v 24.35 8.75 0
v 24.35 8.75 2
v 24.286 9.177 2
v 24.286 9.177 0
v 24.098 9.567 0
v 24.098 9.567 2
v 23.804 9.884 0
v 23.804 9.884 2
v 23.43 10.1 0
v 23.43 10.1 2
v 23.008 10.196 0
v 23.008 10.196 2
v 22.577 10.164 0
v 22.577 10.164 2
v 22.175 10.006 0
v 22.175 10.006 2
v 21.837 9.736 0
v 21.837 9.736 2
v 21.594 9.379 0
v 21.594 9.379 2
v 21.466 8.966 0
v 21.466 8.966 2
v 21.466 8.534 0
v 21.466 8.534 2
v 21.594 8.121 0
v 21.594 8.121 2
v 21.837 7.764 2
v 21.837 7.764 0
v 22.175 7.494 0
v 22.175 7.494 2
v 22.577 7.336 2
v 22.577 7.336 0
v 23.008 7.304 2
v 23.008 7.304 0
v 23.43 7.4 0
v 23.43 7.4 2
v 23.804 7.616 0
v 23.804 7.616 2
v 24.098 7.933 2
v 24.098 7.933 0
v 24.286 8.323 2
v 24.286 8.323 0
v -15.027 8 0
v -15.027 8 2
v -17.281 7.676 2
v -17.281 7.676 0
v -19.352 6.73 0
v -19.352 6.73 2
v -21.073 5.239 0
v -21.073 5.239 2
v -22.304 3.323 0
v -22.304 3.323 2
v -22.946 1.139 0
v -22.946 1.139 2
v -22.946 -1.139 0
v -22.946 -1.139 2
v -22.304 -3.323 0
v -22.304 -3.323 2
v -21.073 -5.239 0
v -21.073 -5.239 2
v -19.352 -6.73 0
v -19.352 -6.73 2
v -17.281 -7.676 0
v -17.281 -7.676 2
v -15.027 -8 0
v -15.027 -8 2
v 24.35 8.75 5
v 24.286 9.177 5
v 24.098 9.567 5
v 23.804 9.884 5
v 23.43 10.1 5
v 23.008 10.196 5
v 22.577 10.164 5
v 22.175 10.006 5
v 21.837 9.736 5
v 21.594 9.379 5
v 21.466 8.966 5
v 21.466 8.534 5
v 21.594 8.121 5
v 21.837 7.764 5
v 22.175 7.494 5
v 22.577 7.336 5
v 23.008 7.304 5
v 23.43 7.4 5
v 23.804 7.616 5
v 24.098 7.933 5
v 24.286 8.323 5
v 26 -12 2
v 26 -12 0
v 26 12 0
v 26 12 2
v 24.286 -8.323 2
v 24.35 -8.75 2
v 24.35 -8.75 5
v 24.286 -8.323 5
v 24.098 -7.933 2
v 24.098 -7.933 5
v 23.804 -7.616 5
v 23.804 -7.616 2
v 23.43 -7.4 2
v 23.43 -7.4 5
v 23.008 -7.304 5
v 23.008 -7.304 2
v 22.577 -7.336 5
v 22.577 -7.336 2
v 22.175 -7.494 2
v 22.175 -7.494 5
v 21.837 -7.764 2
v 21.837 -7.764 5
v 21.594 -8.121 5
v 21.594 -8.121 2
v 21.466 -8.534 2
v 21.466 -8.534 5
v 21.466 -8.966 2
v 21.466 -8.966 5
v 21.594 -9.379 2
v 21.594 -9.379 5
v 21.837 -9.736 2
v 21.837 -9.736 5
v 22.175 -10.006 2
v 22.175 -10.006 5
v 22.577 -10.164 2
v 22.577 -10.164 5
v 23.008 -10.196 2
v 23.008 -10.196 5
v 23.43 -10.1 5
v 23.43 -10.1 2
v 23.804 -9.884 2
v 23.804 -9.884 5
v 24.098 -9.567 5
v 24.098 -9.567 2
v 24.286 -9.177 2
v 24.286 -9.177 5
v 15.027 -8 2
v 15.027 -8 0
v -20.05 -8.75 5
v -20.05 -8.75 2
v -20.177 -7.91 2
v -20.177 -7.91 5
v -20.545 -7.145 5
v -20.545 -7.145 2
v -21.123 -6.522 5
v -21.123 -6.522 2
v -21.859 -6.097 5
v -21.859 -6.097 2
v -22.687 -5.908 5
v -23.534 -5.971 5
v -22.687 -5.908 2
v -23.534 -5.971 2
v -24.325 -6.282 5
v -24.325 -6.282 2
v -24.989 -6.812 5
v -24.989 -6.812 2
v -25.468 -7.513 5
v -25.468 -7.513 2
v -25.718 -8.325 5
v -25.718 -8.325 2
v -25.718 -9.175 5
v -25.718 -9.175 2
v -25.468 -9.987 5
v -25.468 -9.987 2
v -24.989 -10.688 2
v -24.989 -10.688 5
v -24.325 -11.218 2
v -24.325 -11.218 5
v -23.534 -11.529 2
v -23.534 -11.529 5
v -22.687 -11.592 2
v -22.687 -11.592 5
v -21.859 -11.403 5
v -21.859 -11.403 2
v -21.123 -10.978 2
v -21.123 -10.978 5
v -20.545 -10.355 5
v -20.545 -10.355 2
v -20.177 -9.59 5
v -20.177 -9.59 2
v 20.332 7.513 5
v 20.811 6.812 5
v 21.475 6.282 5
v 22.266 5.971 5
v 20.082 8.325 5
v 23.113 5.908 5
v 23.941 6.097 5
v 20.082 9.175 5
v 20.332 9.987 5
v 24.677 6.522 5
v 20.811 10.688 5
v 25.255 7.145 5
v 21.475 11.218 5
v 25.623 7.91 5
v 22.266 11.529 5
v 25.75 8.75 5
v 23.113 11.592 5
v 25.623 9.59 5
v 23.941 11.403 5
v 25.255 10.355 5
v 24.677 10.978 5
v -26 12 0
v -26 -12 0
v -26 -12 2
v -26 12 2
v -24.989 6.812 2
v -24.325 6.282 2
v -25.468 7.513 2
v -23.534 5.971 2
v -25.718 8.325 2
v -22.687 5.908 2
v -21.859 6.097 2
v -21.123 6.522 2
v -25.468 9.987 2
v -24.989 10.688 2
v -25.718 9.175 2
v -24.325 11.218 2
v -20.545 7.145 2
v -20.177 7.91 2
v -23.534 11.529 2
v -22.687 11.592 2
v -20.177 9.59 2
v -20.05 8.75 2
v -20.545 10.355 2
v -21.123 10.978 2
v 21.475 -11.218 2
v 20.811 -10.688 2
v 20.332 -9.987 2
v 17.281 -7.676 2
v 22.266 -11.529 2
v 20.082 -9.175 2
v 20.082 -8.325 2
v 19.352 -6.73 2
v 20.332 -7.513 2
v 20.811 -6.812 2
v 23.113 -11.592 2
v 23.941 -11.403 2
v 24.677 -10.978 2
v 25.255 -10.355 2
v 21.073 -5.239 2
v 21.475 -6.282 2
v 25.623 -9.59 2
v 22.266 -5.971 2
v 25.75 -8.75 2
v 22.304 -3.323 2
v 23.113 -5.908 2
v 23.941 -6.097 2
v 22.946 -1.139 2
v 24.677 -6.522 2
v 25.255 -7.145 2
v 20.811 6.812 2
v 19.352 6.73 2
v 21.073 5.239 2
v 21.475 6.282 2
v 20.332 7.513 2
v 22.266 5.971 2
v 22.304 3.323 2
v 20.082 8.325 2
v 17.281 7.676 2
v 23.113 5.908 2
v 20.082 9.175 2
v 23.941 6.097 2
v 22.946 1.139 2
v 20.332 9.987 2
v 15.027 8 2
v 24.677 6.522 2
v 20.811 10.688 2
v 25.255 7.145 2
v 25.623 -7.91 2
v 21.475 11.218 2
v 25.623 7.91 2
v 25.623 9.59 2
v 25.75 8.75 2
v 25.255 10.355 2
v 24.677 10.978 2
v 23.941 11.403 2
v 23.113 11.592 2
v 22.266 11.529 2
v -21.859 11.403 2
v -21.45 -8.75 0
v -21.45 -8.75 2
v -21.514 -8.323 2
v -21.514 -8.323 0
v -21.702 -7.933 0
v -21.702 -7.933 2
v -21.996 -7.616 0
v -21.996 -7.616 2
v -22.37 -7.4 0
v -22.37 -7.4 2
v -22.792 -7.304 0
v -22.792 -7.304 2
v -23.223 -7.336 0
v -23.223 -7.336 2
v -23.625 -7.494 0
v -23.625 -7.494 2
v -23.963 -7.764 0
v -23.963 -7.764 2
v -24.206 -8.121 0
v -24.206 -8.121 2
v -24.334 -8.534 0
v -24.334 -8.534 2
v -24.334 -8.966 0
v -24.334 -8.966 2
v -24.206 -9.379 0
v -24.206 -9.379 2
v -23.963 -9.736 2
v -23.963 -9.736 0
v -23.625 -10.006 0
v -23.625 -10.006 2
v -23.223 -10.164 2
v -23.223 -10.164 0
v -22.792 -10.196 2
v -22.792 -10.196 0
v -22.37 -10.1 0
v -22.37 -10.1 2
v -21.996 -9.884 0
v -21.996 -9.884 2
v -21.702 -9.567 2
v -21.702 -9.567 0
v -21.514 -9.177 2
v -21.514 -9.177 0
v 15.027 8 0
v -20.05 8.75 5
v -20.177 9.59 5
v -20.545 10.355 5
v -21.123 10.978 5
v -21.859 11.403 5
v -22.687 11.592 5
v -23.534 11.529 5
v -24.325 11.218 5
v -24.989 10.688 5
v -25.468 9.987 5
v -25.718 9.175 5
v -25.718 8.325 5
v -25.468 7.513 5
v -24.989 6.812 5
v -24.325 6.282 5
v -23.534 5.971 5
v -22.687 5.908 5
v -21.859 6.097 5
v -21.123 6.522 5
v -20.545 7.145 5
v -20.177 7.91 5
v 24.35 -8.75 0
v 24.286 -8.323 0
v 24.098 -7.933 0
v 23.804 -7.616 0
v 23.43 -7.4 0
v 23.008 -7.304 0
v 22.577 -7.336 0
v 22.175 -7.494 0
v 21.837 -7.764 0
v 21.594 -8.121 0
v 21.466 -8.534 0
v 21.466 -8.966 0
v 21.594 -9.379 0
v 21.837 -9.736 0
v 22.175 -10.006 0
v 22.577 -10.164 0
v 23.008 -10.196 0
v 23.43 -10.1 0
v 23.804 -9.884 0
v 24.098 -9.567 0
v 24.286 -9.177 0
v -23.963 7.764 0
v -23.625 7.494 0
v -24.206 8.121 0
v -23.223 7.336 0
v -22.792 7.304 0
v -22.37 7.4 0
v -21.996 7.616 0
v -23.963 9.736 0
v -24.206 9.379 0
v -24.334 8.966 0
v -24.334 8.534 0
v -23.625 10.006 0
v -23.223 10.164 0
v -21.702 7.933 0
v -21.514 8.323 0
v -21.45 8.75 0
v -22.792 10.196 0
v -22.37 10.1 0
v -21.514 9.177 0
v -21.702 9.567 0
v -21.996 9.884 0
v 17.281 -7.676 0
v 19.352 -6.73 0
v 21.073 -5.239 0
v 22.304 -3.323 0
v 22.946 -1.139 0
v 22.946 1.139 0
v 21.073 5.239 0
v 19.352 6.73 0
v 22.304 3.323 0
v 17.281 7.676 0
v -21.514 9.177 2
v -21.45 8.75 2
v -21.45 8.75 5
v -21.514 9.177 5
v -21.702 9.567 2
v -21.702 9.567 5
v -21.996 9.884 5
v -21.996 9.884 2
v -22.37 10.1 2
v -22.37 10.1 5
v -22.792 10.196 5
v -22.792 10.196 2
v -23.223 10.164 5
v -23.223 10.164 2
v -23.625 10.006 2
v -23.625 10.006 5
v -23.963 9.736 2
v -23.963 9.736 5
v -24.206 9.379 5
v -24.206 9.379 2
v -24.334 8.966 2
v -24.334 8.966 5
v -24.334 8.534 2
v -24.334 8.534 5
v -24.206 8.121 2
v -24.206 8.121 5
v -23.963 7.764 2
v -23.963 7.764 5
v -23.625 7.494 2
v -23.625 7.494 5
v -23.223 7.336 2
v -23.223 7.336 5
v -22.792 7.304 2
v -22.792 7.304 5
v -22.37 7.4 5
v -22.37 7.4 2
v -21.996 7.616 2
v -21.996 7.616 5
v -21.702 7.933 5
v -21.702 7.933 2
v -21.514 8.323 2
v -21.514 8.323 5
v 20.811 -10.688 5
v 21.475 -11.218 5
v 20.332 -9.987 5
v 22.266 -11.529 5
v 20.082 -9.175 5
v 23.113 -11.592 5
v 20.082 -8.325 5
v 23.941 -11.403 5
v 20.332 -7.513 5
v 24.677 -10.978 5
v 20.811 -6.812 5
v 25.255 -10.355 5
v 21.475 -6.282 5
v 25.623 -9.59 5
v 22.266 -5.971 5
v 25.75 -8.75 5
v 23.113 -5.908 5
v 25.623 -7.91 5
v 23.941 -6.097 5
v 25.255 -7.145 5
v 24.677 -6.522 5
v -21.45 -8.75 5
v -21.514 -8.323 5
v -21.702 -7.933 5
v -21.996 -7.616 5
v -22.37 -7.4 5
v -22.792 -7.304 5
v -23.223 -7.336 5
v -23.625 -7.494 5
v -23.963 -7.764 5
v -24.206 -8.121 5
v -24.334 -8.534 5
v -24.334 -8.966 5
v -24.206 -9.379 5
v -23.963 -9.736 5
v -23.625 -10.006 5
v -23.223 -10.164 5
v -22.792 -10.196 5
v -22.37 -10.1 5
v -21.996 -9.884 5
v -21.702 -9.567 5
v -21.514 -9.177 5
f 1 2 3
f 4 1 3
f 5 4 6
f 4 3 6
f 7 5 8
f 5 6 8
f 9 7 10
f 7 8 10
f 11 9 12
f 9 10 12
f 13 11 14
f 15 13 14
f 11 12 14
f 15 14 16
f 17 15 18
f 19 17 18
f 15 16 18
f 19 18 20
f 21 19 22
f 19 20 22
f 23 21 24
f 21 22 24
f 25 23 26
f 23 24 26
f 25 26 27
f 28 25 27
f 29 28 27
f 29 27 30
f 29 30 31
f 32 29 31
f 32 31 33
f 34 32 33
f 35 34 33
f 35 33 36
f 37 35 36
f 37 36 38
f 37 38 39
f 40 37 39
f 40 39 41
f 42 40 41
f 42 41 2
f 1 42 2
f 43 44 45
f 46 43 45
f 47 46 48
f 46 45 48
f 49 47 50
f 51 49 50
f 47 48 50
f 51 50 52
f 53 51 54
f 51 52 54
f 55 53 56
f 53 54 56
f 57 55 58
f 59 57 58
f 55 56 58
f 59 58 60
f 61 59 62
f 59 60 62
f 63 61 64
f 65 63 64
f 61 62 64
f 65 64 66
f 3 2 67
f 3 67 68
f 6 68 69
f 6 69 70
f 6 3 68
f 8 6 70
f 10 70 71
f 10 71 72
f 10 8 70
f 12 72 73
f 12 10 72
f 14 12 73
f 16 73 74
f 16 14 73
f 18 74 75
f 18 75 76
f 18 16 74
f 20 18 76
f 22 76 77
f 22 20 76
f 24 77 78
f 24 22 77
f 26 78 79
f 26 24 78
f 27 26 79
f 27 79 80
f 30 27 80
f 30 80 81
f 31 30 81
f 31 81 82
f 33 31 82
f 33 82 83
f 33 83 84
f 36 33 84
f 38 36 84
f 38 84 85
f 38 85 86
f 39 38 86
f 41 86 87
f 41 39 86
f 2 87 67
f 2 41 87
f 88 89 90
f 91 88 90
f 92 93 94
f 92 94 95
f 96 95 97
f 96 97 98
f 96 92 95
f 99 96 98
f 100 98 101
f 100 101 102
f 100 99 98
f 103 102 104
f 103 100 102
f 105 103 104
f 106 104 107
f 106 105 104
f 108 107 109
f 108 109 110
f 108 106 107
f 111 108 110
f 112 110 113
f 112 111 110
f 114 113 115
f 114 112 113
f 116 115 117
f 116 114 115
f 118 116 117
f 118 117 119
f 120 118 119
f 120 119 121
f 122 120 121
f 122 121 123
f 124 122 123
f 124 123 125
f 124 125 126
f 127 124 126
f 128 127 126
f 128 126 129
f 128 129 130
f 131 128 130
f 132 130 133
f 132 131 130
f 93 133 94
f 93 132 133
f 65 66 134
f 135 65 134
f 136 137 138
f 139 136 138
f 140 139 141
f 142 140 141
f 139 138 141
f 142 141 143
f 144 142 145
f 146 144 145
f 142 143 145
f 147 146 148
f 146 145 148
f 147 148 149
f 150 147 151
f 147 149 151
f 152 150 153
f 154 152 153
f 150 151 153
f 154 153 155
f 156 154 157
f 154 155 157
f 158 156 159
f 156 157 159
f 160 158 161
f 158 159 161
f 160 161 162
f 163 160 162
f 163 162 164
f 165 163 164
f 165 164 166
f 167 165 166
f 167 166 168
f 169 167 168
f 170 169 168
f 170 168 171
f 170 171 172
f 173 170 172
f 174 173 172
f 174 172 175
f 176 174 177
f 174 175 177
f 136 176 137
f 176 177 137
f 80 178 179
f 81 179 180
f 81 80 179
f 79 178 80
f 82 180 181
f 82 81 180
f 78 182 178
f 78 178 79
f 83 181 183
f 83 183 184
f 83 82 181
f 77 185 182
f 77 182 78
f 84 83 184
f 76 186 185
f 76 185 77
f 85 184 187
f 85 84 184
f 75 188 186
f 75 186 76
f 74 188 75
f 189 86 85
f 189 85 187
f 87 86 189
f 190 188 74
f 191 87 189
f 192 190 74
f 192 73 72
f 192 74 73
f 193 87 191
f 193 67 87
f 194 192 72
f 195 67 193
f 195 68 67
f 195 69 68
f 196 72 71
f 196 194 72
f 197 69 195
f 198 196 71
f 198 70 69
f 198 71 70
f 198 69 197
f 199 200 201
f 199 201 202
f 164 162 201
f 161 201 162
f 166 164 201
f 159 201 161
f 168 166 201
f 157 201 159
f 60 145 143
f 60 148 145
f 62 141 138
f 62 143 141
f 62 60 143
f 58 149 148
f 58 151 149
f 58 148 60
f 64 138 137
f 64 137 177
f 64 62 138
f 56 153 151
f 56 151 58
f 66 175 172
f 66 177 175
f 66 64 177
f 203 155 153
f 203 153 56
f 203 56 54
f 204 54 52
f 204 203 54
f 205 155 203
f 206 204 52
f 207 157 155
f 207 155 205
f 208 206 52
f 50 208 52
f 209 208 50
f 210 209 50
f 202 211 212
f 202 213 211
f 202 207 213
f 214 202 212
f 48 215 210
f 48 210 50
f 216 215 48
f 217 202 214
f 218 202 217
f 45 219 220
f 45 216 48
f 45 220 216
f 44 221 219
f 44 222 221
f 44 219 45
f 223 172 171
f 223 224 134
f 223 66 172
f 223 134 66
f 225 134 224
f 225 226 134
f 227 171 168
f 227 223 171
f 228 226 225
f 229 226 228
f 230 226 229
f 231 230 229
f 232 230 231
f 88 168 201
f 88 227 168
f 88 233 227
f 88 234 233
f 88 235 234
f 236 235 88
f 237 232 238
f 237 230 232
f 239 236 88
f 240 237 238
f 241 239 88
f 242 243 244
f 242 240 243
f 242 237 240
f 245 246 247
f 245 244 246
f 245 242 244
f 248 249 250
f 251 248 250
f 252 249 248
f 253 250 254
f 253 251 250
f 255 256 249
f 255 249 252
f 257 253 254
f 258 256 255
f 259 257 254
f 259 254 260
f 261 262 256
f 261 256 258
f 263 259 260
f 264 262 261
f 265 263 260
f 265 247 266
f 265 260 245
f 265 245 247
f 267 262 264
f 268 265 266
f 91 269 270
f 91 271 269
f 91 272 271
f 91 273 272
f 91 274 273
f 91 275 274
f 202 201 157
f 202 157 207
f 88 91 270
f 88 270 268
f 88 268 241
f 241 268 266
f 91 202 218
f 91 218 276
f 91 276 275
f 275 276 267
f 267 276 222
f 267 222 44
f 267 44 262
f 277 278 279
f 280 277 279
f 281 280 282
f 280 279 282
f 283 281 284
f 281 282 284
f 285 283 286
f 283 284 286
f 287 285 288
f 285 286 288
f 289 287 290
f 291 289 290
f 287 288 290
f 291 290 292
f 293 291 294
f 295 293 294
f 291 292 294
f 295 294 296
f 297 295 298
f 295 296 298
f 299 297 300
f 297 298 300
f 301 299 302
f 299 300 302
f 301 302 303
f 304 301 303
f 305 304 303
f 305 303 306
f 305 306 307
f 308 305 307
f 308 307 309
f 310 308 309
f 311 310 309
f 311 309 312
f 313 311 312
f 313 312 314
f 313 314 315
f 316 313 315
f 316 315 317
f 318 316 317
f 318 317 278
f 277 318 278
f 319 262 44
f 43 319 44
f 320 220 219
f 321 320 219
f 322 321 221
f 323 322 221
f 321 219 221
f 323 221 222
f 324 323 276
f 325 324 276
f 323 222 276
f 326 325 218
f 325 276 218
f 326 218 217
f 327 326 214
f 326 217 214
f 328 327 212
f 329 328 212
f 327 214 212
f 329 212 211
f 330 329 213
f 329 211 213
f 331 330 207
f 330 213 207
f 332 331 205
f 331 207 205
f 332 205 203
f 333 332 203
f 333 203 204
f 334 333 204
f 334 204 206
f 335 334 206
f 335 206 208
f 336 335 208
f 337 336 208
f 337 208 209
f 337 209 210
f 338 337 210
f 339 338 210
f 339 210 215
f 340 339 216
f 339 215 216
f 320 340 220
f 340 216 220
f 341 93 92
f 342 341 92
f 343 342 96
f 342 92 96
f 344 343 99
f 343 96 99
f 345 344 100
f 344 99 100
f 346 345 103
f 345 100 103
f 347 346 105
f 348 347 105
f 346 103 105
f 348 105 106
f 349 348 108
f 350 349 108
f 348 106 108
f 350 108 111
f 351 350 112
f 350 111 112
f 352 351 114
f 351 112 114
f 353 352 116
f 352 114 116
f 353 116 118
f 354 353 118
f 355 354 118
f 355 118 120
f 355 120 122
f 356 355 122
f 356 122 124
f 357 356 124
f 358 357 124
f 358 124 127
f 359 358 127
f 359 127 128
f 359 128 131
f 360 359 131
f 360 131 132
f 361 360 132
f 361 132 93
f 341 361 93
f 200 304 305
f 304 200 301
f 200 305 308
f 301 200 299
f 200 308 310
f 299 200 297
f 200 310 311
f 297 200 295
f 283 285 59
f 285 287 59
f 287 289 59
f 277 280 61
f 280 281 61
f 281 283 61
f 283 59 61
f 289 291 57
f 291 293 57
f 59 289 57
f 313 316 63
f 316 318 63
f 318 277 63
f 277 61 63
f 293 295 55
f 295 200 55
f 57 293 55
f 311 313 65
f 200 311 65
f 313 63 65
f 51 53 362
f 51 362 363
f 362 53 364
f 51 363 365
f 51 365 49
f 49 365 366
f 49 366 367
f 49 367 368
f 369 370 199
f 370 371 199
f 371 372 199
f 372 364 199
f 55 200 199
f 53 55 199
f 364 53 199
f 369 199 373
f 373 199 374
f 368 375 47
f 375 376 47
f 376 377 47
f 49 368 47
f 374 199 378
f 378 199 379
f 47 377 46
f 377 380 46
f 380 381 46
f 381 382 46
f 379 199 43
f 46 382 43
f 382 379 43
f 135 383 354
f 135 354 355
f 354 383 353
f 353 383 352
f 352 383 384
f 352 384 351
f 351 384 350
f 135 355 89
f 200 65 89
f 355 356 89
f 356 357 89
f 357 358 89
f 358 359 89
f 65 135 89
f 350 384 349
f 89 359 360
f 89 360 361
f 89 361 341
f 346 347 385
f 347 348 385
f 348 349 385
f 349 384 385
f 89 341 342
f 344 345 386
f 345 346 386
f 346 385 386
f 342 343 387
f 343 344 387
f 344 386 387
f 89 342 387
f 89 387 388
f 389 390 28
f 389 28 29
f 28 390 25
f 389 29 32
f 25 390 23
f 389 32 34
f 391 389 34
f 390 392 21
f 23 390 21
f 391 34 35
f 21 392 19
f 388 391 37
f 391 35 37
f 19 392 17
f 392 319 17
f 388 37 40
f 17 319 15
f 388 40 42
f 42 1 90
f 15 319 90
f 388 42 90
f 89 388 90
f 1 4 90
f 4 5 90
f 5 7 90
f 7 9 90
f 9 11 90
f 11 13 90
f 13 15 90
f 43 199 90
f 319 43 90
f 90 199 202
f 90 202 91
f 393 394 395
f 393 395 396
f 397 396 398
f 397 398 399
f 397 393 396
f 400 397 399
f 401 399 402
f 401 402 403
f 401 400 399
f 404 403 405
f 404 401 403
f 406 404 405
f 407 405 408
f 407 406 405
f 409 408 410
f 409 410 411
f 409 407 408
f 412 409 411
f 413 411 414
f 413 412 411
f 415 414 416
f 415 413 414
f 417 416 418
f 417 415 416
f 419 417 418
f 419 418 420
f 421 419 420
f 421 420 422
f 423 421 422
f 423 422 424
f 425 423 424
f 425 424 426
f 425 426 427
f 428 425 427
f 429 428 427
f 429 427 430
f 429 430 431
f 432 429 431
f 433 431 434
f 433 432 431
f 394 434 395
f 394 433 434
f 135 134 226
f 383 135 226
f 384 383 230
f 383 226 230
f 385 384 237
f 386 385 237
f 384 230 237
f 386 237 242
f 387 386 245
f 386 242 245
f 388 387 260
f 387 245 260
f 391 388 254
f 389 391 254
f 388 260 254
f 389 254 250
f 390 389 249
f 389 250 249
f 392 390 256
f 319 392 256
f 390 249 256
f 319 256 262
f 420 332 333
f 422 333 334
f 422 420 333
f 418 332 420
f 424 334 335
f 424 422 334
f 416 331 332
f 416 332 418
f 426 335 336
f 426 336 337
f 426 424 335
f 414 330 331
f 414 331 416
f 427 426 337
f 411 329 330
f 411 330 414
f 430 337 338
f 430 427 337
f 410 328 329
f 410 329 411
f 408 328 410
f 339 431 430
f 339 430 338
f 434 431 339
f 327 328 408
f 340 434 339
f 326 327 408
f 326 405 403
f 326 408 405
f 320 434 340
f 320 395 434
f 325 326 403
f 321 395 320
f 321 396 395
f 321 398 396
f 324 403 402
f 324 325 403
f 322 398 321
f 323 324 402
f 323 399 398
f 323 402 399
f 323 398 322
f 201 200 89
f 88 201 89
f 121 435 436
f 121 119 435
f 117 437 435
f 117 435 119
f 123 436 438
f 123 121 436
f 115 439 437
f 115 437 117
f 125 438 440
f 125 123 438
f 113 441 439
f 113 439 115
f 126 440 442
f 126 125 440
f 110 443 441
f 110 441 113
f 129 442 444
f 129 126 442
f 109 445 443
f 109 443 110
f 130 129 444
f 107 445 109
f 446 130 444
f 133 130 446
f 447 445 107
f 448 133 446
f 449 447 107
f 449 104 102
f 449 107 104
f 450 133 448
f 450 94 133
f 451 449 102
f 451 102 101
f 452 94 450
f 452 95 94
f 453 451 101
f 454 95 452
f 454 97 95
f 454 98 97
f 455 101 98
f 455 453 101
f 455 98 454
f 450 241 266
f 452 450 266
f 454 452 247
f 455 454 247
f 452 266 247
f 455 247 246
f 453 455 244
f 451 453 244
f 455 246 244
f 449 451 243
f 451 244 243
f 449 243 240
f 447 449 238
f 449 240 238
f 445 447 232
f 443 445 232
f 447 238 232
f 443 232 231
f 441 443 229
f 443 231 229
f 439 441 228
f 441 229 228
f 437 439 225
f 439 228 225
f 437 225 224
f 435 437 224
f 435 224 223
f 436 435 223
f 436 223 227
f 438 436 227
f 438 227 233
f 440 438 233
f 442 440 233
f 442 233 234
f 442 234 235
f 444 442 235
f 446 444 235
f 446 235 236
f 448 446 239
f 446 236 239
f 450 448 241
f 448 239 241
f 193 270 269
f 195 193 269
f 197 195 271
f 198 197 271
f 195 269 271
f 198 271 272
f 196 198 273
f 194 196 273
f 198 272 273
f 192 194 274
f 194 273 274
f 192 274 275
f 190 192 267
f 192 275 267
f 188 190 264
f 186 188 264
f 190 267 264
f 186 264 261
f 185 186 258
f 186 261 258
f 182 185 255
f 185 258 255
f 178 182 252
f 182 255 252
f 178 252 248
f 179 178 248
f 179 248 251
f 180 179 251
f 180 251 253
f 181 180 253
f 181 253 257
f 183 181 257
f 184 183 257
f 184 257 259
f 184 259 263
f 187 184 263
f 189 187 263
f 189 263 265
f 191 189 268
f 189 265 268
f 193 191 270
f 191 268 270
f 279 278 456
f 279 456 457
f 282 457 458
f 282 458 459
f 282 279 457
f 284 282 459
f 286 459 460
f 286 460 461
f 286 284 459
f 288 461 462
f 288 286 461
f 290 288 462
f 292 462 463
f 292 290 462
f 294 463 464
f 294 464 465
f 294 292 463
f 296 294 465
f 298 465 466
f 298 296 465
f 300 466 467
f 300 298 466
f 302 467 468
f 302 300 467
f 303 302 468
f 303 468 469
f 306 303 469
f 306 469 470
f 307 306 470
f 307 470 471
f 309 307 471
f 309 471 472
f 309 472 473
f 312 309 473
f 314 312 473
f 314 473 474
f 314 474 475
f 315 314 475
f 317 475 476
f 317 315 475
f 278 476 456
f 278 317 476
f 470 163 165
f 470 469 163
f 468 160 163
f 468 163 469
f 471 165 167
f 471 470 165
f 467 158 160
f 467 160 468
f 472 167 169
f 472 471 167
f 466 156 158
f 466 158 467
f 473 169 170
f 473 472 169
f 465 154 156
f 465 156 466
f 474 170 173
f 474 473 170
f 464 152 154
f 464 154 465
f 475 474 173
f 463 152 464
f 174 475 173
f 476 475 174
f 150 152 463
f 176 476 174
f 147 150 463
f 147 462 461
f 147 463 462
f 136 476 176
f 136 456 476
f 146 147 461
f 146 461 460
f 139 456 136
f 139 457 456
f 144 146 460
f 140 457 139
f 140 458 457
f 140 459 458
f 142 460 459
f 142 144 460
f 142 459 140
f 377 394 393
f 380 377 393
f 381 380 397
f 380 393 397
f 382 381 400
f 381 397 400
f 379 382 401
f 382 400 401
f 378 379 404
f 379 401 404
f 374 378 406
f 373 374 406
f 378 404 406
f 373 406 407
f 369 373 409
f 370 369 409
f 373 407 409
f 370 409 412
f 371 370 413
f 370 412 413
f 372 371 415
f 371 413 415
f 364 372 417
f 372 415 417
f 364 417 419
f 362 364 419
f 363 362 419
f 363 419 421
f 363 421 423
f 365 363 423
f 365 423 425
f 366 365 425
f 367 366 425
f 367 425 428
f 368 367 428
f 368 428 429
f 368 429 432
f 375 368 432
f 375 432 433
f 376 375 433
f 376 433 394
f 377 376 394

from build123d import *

# Parameters (mm, degrees)
SKETCH_W        = 52
SKETCH_H        = 24
PAD_DEPTH       = 2
SKETCH001_R     = 1.45
POCKET_DEPTH    = 2.001
SKETCH002_R     = 2.85
SKETCH002_R_2   = 1.45
PAD001_DEPTH    = 3
POCKET001_DEPTH = 2.001


with BuildPart() as part:
    # Sketch → Pad (new body)
    with BuildSketch(Plane.XY):
        Rectangle(SKETCH_W, SKETCH_H)
    extrude(amount=PAD_DEPTH)

    # Sketch001 (on Face6 of Pad) → Pocket (cut, through all)
    with BuildSketch(Plane.XY.offset(2)):
        with Locations((-22.9, 8.75)):
            Circle(SKETCH001_R)
        with Locations((22.9, 8.75)):
            Circle(SKETCH001_R)
        with Locations((22.9, -8.75)):
            Circle(SKETCH001_R)
        with Locations((-22.9, -8.75)):
            Circle(SKETCH001_R)
    extrude(amount=-POCKET_DEPTH, mode=Mode.SUBTRACT)

    # Sketch002 (on Face5 of Pocket) → Pad001 (join)
    with BuildSketch(Plane.XY.offset(2)):
        with Locations((-22.9, 8.75)):
            Circle(SKETCH002_R)
        with Locations((-22.9, 8.75)):
            Circle(SKETCH002_R_2, mode=Mode.SUBTRACT)
        with Locations((22.9, 8.75)):
            Circle(SKETCH002_R)
        with Locations((22.9, 8.75)):
            Circle(SKETCH002_R_2, mode=Mode.SUBTRACT)
        with Locations((22.9, -8.75)):
            Circle(SKETCH002_R)
        with Locations((22.9, -8.75)):
            Circle(SKETCH002_R_2, mode=Mode.SUBTRACT)
        with Locations((-22.9, -8.75)):
            Circle(SKETCH002_R)
        with Locations((-22.9, -8.75)):
            Circle(SKETCH002_R_2, mode=Mode.SUBTRACT)
    extrude(amount=PAD001_DEPTH)

    # Sketch003 (on Face5 of Pad001) → Pocket001 (cut, through all)
    with BuildSketch(Plane.XY.offset(2)):
        with BuildLine():
            ThreePointArc((-15.027266, 8), (-23.027266, 0), (-15.027266, -8))
            Line((-15.027266, -8), (15.027266, -8))
            ThreePointArc((15.027266, -8), (23.027266, 0), (15.027266, 8))
            Line((15.027266, 8), (-15.027266, 8))
        make_face()
    extrude(amount=-POCKET001_DEPTH, mode=Mode.SUBTRACT)


solid = part.part
